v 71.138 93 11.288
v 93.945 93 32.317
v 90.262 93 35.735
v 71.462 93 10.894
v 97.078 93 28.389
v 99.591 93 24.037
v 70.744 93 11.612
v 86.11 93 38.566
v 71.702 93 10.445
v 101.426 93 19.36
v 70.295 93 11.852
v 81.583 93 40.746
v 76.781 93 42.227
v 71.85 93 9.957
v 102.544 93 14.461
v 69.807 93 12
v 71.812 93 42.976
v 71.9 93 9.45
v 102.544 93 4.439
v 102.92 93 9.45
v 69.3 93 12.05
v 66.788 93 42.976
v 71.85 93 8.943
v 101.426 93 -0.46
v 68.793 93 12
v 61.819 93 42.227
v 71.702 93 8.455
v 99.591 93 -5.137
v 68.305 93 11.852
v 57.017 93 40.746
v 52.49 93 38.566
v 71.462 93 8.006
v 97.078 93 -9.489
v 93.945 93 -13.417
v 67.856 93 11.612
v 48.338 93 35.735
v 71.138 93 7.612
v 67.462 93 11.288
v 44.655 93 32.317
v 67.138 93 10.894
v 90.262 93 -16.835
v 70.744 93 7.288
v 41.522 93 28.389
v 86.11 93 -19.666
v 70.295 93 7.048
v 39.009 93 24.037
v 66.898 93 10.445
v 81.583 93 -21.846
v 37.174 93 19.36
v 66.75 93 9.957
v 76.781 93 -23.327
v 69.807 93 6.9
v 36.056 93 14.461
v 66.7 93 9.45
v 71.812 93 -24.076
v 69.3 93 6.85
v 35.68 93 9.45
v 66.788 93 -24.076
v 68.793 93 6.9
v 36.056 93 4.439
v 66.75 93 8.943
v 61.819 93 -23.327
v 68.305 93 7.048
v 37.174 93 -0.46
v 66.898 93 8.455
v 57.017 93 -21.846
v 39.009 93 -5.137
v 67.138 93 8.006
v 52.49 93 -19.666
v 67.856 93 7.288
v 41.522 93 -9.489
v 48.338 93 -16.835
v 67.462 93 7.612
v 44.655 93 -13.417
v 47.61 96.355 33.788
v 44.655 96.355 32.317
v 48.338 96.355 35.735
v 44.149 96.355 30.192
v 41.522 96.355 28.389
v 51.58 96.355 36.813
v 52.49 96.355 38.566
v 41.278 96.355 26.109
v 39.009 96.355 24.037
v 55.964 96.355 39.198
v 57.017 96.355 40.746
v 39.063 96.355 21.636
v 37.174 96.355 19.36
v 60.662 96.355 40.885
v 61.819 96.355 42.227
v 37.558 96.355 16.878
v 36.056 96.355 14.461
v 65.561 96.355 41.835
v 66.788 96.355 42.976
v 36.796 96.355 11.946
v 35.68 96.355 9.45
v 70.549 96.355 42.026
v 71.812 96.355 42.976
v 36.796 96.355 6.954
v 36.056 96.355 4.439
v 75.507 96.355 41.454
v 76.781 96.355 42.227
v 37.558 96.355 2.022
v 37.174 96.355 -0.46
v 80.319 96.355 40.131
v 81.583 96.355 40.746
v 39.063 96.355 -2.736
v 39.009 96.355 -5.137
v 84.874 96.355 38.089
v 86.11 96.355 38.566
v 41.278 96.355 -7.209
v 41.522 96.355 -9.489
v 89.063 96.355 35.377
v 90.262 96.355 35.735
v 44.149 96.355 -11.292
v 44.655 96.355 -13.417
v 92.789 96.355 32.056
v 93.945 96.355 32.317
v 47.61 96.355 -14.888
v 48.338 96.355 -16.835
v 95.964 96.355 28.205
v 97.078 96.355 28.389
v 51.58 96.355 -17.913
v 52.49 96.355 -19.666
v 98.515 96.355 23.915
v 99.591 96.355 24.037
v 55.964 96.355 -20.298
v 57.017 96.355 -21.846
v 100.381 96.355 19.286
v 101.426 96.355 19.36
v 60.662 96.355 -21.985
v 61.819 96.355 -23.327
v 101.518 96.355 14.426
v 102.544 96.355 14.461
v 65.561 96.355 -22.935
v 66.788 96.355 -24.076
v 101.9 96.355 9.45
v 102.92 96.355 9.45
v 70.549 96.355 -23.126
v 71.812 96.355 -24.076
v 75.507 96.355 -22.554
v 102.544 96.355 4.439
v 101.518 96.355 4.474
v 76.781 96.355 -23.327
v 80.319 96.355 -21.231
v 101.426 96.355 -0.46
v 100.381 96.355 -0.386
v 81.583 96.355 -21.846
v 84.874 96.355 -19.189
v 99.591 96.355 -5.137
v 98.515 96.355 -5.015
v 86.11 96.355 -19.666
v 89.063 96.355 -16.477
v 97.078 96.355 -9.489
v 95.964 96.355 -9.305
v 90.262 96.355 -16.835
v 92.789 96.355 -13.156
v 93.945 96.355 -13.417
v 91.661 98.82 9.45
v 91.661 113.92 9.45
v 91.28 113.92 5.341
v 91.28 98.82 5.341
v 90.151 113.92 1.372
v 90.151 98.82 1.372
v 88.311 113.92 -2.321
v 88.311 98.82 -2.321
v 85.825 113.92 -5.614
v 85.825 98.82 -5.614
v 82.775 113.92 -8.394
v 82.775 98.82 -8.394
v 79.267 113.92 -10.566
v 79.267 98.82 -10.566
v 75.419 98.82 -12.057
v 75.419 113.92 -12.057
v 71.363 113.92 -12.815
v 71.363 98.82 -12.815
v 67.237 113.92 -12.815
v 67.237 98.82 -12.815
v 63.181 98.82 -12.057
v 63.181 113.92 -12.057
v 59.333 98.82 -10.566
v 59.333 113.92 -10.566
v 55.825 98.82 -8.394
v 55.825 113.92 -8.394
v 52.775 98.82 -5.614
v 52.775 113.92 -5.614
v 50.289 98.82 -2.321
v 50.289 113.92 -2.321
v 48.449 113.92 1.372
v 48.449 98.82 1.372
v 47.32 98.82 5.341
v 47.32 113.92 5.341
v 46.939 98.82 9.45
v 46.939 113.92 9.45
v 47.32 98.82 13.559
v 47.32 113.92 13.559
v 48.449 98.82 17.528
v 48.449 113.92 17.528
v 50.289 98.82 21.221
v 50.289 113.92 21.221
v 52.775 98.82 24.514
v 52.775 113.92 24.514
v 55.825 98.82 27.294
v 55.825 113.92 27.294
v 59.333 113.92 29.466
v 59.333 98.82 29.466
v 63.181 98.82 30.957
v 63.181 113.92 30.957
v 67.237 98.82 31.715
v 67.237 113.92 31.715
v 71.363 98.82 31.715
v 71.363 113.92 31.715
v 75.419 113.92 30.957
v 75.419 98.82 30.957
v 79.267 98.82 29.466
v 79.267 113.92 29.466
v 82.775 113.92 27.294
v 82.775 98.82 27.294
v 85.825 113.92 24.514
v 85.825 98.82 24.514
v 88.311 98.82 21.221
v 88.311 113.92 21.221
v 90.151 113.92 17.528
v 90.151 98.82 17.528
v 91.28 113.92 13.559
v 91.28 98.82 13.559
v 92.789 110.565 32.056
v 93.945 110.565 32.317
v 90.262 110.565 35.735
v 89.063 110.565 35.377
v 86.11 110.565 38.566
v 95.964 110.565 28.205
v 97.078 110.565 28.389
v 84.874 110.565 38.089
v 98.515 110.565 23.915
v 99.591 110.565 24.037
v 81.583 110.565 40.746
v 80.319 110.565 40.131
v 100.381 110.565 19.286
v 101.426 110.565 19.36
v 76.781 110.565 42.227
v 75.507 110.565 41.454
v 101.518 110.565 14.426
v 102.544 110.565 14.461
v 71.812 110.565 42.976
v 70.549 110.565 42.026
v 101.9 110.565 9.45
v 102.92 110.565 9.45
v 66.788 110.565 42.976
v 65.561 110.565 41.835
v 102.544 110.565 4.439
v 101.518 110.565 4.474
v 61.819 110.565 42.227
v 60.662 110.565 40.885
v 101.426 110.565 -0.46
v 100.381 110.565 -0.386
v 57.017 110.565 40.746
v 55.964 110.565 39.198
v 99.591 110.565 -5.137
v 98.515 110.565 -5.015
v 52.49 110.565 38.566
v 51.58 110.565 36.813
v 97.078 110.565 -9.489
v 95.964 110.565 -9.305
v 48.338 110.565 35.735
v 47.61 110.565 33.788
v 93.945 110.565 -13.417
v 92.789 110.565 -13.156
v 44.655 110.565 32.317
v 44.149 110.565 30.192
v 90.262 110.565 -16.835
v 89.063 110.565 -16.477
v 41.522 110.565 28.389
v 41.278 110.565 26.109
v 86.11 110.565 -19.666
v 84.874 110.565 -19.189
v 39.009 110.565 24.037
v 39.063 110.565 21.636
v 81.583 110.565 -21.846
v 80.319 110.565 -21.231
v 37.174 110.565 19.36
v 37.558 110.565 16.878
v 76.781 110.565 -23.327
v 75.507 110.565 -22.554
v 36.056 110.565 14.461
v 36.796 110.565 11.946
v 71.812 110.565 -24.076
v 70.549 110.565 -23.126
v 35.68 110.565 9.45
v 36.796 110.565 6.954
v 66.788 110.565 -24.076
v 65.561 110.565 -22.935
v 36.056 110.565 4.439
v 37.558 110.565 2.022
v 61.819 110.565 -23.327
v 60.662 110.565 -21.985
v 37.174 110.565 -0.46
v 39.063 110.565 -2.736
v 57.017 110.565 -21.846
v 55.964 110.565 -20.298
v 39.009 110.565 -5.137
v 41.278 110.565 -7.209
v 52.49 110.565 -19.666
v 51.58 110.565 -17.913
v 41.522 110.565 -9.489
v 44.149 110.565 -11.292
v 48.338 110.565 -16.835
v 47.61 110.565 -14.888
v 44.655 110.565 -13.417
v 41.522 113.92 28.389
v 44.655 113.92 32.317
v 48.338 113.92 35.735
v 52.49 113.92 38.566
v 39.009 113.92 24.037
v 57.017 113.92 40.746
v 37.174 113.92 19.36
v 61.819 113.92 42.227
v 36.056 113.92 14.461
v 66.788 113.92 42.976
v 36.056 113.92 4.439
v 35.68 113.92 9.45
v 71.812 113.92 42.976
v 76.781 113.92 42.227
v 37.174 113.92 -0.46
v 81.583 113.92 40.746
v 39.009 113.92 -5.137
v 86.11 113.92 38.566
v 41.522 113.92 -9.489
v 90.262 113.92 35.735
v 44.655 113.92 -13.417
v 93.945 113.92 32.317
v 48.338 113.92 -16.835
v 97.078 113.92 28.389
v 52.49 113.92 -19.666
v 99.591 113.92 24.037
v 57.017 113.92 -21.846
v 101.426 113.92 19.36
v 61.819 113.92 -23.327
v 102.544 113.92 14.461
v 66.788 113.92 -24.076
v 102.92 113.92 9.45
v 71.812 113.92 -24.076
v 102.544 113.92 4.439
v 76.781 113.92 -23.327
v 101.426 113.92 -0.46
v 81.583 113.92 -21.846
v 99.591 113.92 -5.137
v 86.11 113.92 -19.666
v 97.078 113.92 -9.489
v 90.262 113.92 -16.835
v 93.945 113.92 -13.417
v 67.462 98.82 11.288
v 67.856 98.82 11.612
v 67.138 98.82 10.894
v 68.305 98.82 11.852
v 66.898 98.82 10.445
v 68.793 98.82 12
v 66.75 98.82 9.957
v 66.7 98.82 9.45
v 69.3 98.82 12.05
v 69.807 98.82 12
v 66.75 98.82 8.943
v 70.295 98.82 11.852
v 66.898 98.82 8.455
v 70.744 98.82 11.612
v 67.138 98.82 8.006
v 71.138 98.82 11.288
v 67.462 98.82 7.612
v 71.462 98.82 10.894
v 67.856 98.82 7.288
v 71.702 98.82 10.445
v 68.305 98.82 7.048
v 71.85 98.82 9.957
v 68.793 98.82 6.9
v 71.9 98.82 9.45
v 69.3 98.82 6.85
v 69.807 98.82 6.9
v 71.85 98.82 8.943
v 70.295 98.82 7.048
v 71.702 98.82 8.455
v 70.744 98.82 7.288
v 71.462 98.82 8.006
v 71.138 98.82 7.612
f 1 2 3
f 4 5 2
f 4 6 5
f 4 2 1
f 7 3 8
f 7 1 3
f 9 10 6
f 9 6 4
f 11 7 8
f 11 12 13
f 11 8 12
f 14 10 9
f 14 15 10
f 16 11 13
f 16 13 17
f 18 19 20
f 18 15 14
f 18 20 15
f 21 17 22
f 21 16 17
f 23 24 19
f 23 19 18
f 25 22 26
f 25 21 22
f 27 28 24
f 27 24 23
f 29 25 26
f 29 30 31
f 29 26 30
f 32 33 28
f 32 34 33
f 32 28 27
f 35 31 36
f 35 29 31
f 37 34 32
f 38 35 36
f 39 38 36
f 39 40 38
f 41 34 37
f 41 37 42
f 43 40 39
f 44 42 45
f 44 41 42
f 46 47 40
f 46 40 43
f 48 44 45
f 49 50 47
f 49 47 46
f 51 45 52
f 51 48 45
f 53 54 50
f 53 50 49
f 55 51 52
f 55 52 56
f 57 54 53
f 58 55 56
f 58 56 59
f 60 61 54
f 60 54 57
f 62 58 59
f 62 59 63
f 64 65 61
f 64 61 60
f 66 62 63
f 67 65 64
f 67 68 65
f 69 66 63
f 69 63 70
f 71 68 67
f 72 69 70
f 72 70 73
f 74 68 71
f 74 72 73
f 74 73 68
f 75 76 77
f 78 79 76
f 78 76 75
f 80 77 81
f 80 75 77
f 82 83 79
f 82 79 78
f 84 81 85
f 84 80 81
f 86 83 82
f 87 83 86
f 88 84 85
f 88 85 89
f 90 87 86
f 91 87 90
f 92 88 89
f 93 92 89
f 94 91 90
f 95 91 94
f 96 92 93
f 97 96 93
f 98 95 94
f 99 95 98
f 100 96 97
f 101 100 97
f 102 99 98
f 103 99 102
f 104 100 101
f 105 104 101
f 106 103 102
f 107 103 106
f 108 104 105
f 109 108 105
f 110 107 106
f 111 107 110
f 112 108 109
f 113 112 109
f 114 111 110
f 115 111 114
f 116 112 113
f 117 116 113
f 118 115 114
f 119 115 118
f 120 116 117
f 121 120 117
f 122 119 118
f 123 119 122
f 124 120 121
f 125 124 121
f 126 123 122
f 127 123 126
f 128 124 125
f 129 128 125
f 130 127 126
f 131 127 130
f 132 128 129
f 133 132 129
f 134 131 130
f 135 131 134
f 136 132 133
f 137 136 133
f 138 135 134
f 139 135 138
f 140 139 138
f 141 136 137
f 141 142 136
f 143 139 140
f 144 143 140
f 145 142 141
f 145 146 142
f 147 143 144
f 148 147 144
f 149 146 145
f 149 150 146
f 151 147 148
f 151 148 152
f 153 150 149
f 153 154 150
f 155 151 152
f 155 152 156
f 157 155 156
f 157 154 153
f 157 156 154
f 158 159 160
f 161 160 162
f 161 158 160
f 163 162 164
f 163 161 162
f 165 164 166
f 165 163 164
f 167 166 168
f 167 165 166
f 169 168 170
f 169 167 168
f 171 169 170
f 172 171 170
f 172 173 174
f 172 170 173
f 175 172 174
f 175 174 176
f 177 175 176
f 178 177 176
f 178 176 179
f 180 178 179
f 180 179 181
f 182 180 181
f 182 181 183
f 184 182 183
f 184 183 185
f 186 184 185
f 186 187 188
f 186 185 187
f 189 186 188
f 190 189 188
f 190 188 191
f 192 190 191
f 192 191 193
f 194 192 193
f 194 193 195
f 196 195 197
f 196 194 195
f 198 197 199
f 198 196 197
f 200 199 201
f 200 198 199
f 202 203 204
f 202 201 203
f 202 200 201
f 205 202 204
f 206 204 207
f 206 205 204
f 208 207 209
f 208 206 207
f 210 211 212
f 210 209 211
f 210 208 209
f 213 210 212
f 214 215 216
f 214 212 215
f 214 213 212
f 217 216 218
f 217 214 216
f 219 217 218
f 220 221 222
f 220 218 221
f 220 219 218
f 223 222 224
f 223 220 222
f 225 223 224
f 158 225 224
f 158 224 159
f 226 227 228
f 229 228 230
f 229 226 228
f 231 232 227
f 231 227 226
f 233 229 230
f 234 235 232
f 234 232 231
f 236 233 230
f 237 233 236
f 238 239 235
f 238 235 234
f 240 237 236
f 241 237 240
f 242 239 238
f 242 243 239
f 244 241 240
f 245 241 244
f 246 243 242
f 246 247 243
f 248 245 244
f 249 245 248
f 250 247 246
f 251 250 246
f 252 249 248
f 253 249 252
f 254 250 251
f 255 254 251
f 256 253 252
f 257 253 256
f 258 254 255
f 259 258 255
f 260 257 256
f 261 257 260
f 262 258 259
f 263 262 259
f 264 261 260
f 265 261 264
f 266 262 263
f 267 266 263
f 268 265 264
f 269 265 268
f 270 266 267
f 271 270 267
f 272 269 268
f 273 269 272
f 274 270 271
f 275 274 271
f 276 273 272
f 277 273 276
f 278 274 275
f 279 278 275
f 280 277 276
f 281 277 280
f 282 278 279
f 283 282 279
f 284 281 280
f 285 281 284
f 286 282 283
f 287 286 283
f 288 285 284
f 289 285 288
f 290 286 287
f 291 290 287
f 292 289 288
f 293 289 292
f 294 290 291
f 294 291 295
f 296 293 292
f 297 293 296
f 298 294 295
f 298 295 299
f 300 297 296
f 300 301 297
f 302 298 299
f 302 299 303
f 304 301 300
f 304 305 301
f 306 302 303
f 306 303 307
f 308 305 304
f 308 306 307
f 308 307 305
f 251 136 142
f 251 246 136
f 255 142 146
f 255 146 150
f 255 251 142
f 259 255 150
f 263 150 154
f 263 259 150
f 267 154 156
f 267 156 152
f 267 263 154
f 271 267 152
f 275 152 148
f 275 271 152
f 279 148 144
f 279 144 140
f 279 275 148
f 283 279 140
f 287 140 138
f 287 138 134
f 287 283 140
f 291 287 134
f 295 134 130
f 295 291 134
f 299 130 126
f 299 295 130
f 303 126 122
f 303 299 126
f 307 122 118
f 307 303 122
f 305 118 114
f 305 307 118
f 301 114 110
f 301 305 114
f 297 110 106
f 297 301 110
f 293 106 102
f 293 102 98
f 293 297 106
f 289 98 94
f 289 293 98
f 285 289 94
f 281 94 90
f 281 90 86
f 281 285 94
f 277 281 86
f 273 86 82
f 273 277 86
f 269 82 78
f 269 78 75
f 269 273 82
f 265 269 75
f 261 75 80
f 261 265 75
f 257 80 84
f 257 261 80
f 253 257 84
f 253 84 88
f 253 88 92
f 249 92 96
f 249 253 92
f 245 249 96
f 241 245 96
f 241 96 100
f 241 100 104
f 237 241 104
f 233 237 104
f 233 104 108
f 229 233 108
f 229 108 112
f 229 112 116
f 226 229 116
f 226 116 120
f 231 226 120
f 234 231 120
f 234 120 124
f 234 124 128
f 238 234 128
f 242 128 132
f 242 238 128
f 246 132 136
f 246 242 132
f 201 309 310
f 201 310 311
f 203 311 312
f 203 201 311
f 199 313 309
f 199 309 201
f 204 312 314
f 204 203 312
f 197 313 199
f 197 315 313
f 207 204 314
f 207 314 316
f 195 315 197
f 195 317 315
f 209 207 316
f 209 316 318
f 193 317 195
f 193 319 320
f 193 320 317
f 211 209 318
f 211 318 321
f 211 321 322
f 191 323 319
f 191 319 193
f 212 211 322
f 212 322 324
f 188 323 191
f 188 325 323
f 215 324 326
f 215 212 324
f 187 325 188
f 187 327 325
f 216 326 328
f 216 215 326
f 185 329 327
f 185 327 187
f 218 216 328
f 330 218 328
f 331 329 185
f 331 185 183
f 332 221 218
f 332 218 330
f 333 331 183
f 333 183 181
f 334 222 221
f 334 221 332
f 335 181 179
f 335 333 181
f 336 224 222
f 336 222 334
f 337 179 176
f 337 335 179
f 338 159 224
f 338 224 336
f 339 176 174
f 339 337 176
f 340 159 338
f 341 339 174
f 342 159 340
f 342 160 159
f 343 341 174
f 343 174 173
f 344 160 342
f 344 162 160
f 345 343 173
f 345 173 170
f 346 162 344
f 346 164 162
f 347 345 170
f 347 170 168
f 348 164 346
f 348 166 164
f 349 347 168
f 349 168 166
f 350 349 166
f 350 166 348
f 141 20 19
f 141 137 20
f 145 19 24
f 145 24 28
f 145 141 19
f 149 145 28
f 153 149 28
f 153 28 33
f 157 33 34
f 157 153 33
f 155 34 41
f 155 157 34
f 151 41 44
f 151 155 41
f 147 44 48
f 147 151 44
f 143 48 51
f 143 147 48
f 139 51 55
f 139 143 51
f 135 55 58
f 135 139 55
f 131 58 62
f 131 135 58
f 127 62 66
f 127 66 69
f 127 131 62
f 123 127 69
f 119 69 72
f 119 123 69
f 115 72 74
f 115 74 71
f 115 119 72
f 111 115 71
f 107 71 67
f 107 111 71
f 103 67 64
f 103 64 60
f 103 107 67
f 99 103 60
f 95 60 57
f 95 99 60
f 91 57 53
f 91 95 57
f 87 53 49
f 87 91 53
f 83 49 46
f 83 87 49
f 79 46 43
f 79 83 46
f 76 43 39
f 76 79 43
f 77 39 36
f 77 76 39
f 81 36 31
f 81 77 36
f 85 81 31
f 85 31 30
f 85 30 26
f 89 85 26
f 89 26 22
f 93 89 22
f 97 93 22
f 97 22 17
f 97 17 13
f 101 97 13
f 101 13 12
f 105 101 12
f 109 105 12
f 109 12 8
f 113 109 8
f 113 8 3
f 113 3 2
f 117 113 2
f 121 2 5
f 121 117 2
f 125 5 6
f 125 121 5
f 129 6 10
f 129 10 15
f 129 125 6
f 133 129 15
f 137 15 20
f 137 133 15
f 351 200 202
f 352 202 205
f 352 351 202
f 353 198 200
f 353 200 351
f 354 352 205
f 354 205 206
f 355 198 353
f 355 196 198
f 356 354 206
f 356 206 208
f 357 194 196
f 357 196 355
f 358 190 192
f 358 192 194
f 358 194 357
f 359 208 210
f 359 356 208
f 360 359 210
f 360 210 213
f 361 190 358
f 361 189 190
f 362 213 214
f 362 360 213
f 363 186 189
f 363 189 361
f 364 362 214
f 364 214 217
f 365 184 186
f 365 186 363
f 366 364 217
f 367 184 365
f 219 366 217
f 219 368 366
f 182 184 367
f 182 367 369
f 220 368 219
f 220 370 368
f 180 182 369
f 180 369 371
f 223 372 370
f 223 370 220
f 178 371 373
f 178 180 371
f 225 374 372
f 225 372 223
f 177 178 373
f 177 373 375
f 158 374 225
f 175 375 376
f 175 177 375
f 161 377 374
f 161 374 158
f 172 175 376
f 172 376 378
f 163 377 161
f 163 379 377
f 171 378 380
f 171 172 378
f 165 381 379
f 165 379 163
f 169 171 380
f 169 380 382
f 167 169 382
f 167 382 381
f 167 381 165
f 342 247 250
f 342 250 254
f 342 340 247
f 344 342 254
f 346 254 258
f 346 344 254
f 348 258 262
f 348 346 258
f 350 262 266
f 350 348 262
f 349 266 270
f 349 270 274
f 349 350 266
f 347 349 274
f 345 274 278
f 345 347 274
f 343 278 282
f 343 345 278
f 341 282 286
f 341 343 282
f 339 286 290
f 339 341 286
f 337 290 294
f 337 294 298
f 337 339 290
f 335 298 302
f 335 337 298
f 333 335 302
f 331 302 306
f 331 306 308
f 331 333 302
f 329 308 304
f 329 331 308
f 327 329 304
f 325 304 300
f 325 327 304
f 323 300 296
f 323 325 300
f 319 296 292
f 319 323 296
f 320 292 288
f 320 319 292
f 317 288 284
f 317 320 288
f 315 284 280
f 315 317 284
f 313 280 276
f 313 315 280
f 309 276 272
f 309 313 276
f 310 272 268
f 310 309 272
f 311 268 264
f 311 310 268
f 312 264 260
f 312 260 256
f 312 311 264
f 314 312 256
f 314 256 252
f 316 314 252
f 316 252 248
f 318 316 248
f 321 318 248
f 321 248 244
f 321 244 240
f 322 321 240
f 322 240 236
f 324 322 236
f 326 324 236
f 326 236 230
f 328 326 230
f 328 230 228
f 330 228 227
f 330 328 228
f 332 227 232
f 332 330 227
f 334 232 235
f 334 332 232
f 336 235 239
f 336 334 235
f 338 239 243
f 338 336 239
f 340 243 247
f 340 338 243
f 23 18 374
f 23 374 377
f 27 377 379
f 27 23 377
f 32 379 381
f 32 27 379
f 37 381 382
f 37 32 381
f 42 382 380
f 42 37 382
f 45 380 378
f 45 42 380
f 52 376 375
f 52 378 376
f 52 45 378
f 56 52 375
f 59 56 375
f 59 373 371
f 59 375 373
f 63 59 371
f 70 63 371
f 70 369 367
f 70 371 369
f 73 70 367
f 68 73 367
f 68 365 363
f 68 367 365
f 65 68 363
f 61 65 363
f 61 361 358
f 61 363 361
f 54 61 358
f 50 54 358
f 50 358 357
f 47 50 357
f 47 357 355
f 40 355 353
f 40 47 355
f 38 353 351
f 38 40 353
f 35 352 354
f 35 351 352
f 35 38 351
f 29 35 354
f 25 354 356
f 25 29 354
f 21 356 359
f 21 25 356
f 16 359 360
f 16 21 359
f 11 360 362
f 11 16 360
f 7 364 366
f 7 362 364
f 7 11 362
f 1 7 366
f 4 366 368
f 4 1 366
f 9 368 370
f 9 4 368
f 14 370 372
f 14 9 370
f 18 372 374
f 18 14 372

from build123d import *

# Parameters (mm, degrees)
SKETCH185_R            = 2.6
EXTRUDE200_DEPTH       = 10
SKETCH184_R            = 22.36068
EXTRUDE199_DEPTH       = 20
CUT127_PLACEMENT_ANGLE = 270


with BuildPart() as extrude200:
    # Sketch185 (on Face9 of Cut126) → Extrude200 (new body)
    with BuildSketch(Plane.XY.offset(5.82)):
        Circle(SKETCH185_R)
    extrude(amount=EXTRUDE200_DEPTH)


with BuildPart() as extrude200_1:
    # Extrude200 placement: moved
    add(extrude200.part.moved(Location((0, 0, -7.5))))


with BuildPart() as extrude199:
    # Sketch184 (on Face7 of Revolve005) → Extrude199 (new body)
    with BuildSketch(Plane.XY.offset(20.92)):
        Circle(SKETCH184_R)
    extrude(amount=EXTRUDE199_DEPTH)


with BuildPart() as extrude199_1:
    # Extrude199 placement: moved
    add(extrude199.part.moved(Location((0, 0, -15.1))))


with BuildPart() as rueda_delantera002:
    # Sketch183 → Revolve005 (revolve)
    with BuildSketch(Plane.XZ):
        Polygon((0, 0), (33.62, 0), (33.62, 3.355495), (32.6, 3.355495), (32.6, 17.564505), (33.62, 17.564505), (33.62, 20.92), (0, 20.92), align=None)
    revolve(axis=Axis((0, 0, 0), (0, 0, 1)))

    # Cut126: cut Extrude199
    add(extrude199_1.part, mode=Mode.SUBTRACT)

    # Cut127: cut Extrude200
    add(extrude200_1.part, mode=Mode.SUBTRACT)


with BuildPart() as rueda_delantera002_1:
    # Cut127 placement: moved
    add(rueda_delantera002.part.moved(Location((69.3, 93, 9.45))).rotate(Axis((69.3, 93, 9.45), (1, 0, 0)), CUT127_PLACEMENT_ANGLE))


solid = rueda_delantera002_1.part
